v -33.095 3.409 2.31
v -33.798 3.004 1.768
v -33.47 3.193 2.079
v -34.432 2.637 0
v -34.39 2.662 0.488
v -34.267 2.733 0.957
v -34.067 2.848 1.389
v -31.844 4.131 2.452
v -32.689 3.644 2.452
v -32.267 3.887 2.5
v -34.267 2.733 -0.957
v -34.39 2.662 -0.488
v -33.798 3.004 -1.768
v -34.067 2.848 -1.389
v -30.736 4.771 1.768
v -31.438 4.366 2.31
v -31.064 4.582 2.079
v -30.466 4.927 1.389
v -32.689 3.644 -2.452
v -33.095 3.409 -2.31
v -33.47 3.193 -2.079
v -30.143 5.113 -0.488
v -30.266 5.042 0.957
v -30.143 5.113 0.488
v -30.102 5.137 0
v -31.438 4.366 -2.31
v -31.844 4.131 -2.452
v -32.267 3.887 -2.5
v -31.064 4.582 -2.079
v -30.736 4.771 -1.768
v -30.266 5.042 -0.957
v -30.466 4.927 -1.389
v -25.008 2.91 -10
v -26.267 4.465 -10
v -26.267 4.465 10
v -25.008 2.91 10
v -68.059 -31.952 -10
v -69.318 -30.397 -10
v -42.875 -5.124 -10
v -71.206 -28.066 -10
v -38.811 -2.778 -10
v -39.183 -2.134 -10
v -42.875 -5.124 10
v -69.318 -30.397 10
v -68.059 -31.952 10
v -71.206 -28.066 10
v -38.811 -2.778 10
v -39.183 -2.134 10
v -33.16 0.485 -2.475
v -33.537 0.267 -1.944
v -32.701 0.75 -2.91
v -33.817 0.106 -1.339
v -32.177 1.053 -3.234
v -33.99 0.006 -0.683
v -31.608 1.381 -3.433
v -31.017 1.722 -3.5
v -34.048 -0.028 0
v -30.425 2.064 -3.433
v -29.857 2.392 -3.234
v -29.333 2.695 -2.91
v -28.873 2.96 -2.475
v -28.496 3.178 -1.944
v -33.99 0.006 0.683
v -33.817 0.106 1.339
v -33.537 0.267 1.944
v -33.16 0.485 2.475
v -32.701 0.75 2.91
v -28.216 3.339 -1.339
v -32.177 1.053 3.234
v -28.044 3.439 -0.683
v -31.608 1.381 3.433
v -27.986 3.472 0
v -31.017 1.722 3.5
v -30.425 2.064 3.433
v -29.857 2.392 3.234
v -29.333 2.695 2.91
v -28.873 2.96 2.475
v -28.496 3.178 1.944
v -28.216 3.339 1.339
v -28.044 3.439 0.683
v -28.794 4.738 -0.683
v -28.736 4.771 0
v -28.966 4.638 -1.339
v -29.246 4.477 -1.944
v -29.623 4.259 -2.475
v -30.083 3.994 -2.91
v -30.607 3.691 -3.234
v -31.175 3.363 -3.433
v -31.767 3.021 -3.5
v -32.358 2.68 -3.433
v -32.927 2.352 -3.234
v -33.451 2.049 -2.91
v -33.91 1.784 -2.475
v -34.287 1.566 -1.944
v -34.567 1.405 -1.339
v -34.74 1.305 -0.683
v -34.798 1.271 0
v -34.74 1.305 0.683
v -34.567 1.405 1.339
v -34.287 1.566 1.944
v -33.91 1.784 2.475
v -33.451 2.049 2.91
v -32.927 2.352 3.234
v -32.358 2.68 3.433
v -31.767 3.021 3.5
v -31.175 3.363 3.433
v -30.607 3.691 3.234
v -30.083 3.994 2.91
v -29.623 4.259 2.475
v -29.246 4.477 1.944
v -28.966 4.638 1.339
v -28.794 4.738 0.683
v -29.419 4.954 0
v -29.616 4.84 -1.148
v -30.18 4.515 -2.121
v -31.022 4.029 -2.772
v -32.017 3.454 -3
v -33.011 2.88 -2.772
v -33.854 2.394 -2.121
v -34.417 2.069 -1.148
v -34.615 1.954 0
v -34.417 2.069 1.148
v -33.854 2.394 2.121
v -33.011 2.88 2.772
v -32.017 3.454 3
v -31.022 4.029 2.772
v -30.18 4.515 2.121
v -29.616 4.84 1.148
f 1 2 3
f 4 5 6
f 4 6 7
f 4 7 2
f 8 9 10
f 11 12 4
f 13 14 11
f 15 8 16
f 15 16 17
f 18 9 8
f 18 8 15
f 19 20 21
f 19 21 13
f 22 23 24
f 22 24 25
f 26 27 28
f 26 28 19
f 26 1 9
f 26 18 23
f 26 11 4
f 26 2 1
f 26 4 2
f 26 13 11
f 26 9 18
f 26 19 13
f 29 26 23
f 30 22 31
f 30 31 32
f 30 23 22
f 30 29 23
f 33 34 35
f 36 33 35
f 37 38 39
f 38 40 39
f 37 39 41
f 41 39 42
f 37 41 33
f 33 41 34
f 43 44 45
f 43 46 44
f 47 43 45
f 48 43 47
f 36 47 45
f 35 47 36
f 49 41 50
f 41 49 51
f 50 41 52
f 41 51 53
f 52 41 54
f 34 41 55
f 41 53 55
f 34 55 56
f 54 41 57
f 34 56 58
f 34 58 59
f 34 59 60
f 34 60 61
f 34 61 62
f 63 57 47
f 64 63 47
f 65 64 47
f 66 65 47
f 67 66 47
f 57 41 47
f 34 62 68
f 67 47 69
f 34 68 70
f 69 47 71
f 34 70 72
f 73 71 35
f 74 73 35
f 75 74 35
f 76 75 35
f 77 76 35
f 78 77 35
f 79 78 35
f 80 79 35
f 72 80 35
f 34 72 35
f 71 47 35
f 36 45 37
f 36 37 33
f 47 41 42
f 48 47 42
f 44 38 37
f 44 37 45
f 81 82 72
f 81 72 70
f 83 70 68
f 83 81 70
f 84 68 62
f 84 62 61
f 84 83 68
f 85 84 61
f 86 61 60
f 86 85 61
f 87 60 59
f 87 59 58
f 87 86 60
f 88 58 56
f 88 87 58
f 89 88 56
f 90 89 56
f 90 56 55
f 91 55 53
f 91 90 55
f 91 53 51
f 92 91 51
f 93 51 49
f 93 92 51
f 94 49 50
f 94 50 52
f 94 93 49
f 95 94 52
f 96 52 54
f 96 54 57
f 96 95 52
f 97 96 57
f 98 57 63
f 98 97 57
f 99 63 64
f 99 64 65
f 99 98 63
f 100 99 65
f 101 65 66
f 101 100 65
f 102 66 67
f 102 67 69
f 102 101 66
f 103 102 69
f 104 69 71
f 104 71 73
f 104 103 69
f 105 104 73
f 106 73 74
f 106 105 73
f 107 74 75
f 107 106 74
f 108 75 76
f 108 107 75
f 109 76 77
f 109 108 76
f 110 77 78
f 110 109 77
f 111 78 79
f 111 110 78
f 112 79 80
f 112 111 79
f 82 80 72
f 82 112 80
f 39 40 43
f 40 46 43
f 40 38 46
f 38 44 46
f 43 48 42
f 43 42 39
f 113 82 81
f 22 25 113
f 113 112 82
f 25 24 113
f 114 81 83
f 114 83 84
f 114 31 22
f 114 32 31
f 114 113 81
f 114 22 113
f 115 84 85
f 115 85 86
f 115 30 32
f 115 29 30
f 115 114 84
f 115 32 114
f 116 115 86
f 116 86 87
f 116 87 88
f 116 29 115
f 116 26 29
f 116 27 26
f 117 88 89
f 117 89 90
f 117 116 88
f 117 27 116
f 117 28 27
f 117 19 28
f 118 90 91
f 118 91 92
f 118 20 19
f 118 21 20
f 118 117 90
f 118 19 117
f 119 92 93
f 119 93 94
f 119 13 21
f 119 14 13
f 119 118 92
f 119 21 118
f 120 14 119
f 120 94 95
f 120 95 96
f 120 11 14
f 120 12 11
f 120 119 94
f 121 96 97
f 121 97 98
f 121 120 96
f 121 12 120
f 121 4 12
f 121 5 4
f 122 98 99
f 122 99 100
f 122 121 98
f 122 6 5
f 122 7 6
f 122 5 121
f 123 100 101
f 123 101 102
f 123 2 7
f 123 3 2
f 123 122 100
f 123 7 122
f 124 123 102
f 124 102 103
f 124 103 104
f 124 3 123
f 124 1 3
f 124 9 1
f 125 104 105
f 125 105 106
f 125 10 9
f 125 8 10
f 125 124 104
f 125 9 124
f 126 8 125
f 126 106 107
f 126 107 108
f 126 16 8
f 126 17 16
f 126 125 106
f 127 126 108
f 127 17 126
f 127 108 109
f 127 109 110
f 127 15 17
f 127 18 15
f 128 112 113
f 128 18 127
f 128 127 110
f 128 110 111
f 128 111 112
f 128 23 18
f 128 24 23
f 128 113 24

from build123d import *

# Parameters (mm, degrees)
EXTRUDE_1_DEPTH     = 9
SKETCH_2_R          = 3.5
CUT_EXTRUDE_1_DEPTH = 18
EXTRUDE_2_DEPTH     = 10
EXTRUDE_START       = 2.5
SKETCH_4_R          = 3.5
EXTRUDE_3_DEPTH     = 2.5
CHAMFER_1_SIZE      = 1
EXTRUDE_4_DEPTH     = 10
SKETCH_7_W          = 63.046601733
SKETCH_7_H          = 81.446187988
CUT_EXTRUDE_2_DEPTH = 10
SKETCH_8_W          = 55.396674472
SKETCH_8_H          = 20
EXTRUDE_5_DEPTH     = 2


with BuildPart() as part:
    # 草图1 → 凸台-拉伸1 (new, symmetric)
    with BuildSketch(Plane.XY):
        with BuildLine():
            Line((-38.810889132, -2.777568136), (-8.5, 14.722431864))
            ThreePointArc((-8.5, 14.722431864), (-1.481647627, 16.935309868), (5.814342437, 15.974774553))
            Line((5.814342437, 15.974774553), (6.498382723, 17.854159795))
            ThreePointArc((6.498382723, 17.854159795), (-1.655959112, 18.927699264), (-9.5, 16.454482672))
            Line((-9.5, 16.454482672), (-39.810889132, -1.045517328))
            Line((-39.810889132, -1.045517328), (-38.810889132, -2.777568136))
        make_face()
    extrude(amount=EXTRUDE_1_DEPTH, both=True)

    # 草图2 → 切除-拉伸1 (cut)
    with BuildSketch(Plane(origin=(-9.5, 16.454482672, 0), x_dir=(0.8660254037844398, 0.49999999999999806, 0), z_dir=(-0.49999999999999806, 0.8660254037844398, 0))):
        with Locations(Location((-26, 0, 0), (0, 0, 180))):
            Circle(SKETCH_2_R)
    extrude(amount=-CUT_EXTRUDE_1_DEPTH, mode=Mode.SUBTRACT)

    # 草图7 → 切除-拉伸2 (cut, symmetric)
    with BuildSketch(Plane.XY):
        with Locations((-23.889592718, 14.899687111)):
            Rectangle(SKETCH_7_W, SKETCH_7_H)
    extrude(amount=CUT_EXTRUDE_2_DEPTH, both=True, mode=Mode.SUBTRACT)


with BuildPart() as body_2:
    # 草图3 → 凸台-拉伸2 (new, symmetric)
    with BuildSketch(Plane.XY):
        Polygon((-26.266761163, 4.464787524), (-69.318063007, -30.397469317), (-71.206024181, -28.066031433), (-42.87484181, -5.123892308), align=None)
    extrude(amount=EXTRUDE_2_DEPTH, both=True)

    # 草图4 → 凸台-拉伸3 (add)
    with BuildSketch(Plane(origin=(-8.5, 14.722431864, 0), x_dir=(0.8660254037844386, 0.5000000000000001, 0), z_dir=(-0.5000000000000001, 0.8660254037844386, 0)).offset(EXTRUDE_START)):
        with Locations((-26, 0)):
            Circle(SKETCH_4_R)
    extrude(amount=-EXTRUDE_3_DEPTH)

    # 倒角1
    chamfer_1_edges = [body_2.edges().sort_by_distance(p)[0] for p in [
        (-35.297749412, 2.137495374, 0),
    ]]
    chamfer(chamfer_1_edges, length=CHAMFER_1_SIZE)

    # 草图6 → 凸台-拉伸4 (add, symmetric)
    with BuildSketch(Plane.XY):
        Polygon((-38.810889132, -2.777568136), (-39.182510373, -2.133901265), (-42.87484181, -5.123892308), align=None)
    extrude(amount=EXTRUDE_4_DEPTH, both=True)

    # 草图8 → 凸台-拉伸5 (add)
    with BuildSketch(Plane(origin=(-12.586407821, 15.542919229, 0), x_dir=(0.7771459614569706, 0.6293203910498378, 0), z_dir=(0.6293203910498378, -0.7771459614569706, 0))):
        with Locations((-45.301662764, 0)):
            Rectangle(SKETCH_8_W, SKETCH_8_H)
    extrude(amount=EXTRUDE_5_DEPTH)


solid = body_2.part
